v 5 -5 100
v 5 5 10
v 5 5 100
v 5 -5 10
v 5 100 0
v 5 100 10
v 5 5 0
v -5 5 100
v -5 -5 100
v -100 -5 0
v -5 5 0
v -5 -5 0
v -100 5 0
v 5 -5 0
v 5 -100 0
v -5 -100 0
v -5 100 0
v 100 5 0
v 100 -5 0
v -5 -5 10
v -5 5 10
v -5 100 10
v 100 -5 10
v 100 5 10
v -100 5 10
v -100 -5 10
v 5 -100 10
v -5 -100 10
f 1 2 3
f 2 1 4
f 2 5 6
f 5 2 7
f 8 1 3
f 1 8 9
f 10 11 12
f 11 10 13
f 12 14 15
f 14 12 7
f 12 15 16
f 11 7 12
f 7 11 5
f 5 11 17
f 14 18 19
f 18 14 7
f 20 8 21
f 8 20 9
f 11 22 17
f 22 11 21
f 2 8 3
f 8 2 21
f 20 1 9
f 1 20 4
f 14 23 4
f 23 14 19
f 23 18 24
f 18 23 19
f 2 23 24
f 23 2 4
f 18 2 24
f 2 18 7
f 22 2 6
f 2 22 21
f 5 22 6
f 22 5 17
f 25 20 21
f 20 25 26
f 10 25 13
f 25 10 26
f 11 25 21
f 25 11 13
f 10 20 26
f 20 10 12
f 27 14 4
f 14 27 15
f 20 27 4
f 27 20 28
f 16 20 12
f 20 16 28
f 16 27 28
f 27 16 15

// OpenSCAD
lengde=100;
bredde=10;

translate([-bredde/2,-bredde/2,0]) cube([bredde,bredde,lengde]);
translate([bredde/2,-bredde/2,0]) cube([lengde-bredde/2,bredde,bredde]);
translate([-bredde/2,bredde/2,0]) cube([bredde,lengde-bredde/2,bredde]);
translate([-lengde,-bredde/2,0]) cube([lengde-bredde/2,bredde,bredde]);
translate([-bredde/2,-lengde,0]) cube([bredde,lengde-bredde/2,bredde]);
